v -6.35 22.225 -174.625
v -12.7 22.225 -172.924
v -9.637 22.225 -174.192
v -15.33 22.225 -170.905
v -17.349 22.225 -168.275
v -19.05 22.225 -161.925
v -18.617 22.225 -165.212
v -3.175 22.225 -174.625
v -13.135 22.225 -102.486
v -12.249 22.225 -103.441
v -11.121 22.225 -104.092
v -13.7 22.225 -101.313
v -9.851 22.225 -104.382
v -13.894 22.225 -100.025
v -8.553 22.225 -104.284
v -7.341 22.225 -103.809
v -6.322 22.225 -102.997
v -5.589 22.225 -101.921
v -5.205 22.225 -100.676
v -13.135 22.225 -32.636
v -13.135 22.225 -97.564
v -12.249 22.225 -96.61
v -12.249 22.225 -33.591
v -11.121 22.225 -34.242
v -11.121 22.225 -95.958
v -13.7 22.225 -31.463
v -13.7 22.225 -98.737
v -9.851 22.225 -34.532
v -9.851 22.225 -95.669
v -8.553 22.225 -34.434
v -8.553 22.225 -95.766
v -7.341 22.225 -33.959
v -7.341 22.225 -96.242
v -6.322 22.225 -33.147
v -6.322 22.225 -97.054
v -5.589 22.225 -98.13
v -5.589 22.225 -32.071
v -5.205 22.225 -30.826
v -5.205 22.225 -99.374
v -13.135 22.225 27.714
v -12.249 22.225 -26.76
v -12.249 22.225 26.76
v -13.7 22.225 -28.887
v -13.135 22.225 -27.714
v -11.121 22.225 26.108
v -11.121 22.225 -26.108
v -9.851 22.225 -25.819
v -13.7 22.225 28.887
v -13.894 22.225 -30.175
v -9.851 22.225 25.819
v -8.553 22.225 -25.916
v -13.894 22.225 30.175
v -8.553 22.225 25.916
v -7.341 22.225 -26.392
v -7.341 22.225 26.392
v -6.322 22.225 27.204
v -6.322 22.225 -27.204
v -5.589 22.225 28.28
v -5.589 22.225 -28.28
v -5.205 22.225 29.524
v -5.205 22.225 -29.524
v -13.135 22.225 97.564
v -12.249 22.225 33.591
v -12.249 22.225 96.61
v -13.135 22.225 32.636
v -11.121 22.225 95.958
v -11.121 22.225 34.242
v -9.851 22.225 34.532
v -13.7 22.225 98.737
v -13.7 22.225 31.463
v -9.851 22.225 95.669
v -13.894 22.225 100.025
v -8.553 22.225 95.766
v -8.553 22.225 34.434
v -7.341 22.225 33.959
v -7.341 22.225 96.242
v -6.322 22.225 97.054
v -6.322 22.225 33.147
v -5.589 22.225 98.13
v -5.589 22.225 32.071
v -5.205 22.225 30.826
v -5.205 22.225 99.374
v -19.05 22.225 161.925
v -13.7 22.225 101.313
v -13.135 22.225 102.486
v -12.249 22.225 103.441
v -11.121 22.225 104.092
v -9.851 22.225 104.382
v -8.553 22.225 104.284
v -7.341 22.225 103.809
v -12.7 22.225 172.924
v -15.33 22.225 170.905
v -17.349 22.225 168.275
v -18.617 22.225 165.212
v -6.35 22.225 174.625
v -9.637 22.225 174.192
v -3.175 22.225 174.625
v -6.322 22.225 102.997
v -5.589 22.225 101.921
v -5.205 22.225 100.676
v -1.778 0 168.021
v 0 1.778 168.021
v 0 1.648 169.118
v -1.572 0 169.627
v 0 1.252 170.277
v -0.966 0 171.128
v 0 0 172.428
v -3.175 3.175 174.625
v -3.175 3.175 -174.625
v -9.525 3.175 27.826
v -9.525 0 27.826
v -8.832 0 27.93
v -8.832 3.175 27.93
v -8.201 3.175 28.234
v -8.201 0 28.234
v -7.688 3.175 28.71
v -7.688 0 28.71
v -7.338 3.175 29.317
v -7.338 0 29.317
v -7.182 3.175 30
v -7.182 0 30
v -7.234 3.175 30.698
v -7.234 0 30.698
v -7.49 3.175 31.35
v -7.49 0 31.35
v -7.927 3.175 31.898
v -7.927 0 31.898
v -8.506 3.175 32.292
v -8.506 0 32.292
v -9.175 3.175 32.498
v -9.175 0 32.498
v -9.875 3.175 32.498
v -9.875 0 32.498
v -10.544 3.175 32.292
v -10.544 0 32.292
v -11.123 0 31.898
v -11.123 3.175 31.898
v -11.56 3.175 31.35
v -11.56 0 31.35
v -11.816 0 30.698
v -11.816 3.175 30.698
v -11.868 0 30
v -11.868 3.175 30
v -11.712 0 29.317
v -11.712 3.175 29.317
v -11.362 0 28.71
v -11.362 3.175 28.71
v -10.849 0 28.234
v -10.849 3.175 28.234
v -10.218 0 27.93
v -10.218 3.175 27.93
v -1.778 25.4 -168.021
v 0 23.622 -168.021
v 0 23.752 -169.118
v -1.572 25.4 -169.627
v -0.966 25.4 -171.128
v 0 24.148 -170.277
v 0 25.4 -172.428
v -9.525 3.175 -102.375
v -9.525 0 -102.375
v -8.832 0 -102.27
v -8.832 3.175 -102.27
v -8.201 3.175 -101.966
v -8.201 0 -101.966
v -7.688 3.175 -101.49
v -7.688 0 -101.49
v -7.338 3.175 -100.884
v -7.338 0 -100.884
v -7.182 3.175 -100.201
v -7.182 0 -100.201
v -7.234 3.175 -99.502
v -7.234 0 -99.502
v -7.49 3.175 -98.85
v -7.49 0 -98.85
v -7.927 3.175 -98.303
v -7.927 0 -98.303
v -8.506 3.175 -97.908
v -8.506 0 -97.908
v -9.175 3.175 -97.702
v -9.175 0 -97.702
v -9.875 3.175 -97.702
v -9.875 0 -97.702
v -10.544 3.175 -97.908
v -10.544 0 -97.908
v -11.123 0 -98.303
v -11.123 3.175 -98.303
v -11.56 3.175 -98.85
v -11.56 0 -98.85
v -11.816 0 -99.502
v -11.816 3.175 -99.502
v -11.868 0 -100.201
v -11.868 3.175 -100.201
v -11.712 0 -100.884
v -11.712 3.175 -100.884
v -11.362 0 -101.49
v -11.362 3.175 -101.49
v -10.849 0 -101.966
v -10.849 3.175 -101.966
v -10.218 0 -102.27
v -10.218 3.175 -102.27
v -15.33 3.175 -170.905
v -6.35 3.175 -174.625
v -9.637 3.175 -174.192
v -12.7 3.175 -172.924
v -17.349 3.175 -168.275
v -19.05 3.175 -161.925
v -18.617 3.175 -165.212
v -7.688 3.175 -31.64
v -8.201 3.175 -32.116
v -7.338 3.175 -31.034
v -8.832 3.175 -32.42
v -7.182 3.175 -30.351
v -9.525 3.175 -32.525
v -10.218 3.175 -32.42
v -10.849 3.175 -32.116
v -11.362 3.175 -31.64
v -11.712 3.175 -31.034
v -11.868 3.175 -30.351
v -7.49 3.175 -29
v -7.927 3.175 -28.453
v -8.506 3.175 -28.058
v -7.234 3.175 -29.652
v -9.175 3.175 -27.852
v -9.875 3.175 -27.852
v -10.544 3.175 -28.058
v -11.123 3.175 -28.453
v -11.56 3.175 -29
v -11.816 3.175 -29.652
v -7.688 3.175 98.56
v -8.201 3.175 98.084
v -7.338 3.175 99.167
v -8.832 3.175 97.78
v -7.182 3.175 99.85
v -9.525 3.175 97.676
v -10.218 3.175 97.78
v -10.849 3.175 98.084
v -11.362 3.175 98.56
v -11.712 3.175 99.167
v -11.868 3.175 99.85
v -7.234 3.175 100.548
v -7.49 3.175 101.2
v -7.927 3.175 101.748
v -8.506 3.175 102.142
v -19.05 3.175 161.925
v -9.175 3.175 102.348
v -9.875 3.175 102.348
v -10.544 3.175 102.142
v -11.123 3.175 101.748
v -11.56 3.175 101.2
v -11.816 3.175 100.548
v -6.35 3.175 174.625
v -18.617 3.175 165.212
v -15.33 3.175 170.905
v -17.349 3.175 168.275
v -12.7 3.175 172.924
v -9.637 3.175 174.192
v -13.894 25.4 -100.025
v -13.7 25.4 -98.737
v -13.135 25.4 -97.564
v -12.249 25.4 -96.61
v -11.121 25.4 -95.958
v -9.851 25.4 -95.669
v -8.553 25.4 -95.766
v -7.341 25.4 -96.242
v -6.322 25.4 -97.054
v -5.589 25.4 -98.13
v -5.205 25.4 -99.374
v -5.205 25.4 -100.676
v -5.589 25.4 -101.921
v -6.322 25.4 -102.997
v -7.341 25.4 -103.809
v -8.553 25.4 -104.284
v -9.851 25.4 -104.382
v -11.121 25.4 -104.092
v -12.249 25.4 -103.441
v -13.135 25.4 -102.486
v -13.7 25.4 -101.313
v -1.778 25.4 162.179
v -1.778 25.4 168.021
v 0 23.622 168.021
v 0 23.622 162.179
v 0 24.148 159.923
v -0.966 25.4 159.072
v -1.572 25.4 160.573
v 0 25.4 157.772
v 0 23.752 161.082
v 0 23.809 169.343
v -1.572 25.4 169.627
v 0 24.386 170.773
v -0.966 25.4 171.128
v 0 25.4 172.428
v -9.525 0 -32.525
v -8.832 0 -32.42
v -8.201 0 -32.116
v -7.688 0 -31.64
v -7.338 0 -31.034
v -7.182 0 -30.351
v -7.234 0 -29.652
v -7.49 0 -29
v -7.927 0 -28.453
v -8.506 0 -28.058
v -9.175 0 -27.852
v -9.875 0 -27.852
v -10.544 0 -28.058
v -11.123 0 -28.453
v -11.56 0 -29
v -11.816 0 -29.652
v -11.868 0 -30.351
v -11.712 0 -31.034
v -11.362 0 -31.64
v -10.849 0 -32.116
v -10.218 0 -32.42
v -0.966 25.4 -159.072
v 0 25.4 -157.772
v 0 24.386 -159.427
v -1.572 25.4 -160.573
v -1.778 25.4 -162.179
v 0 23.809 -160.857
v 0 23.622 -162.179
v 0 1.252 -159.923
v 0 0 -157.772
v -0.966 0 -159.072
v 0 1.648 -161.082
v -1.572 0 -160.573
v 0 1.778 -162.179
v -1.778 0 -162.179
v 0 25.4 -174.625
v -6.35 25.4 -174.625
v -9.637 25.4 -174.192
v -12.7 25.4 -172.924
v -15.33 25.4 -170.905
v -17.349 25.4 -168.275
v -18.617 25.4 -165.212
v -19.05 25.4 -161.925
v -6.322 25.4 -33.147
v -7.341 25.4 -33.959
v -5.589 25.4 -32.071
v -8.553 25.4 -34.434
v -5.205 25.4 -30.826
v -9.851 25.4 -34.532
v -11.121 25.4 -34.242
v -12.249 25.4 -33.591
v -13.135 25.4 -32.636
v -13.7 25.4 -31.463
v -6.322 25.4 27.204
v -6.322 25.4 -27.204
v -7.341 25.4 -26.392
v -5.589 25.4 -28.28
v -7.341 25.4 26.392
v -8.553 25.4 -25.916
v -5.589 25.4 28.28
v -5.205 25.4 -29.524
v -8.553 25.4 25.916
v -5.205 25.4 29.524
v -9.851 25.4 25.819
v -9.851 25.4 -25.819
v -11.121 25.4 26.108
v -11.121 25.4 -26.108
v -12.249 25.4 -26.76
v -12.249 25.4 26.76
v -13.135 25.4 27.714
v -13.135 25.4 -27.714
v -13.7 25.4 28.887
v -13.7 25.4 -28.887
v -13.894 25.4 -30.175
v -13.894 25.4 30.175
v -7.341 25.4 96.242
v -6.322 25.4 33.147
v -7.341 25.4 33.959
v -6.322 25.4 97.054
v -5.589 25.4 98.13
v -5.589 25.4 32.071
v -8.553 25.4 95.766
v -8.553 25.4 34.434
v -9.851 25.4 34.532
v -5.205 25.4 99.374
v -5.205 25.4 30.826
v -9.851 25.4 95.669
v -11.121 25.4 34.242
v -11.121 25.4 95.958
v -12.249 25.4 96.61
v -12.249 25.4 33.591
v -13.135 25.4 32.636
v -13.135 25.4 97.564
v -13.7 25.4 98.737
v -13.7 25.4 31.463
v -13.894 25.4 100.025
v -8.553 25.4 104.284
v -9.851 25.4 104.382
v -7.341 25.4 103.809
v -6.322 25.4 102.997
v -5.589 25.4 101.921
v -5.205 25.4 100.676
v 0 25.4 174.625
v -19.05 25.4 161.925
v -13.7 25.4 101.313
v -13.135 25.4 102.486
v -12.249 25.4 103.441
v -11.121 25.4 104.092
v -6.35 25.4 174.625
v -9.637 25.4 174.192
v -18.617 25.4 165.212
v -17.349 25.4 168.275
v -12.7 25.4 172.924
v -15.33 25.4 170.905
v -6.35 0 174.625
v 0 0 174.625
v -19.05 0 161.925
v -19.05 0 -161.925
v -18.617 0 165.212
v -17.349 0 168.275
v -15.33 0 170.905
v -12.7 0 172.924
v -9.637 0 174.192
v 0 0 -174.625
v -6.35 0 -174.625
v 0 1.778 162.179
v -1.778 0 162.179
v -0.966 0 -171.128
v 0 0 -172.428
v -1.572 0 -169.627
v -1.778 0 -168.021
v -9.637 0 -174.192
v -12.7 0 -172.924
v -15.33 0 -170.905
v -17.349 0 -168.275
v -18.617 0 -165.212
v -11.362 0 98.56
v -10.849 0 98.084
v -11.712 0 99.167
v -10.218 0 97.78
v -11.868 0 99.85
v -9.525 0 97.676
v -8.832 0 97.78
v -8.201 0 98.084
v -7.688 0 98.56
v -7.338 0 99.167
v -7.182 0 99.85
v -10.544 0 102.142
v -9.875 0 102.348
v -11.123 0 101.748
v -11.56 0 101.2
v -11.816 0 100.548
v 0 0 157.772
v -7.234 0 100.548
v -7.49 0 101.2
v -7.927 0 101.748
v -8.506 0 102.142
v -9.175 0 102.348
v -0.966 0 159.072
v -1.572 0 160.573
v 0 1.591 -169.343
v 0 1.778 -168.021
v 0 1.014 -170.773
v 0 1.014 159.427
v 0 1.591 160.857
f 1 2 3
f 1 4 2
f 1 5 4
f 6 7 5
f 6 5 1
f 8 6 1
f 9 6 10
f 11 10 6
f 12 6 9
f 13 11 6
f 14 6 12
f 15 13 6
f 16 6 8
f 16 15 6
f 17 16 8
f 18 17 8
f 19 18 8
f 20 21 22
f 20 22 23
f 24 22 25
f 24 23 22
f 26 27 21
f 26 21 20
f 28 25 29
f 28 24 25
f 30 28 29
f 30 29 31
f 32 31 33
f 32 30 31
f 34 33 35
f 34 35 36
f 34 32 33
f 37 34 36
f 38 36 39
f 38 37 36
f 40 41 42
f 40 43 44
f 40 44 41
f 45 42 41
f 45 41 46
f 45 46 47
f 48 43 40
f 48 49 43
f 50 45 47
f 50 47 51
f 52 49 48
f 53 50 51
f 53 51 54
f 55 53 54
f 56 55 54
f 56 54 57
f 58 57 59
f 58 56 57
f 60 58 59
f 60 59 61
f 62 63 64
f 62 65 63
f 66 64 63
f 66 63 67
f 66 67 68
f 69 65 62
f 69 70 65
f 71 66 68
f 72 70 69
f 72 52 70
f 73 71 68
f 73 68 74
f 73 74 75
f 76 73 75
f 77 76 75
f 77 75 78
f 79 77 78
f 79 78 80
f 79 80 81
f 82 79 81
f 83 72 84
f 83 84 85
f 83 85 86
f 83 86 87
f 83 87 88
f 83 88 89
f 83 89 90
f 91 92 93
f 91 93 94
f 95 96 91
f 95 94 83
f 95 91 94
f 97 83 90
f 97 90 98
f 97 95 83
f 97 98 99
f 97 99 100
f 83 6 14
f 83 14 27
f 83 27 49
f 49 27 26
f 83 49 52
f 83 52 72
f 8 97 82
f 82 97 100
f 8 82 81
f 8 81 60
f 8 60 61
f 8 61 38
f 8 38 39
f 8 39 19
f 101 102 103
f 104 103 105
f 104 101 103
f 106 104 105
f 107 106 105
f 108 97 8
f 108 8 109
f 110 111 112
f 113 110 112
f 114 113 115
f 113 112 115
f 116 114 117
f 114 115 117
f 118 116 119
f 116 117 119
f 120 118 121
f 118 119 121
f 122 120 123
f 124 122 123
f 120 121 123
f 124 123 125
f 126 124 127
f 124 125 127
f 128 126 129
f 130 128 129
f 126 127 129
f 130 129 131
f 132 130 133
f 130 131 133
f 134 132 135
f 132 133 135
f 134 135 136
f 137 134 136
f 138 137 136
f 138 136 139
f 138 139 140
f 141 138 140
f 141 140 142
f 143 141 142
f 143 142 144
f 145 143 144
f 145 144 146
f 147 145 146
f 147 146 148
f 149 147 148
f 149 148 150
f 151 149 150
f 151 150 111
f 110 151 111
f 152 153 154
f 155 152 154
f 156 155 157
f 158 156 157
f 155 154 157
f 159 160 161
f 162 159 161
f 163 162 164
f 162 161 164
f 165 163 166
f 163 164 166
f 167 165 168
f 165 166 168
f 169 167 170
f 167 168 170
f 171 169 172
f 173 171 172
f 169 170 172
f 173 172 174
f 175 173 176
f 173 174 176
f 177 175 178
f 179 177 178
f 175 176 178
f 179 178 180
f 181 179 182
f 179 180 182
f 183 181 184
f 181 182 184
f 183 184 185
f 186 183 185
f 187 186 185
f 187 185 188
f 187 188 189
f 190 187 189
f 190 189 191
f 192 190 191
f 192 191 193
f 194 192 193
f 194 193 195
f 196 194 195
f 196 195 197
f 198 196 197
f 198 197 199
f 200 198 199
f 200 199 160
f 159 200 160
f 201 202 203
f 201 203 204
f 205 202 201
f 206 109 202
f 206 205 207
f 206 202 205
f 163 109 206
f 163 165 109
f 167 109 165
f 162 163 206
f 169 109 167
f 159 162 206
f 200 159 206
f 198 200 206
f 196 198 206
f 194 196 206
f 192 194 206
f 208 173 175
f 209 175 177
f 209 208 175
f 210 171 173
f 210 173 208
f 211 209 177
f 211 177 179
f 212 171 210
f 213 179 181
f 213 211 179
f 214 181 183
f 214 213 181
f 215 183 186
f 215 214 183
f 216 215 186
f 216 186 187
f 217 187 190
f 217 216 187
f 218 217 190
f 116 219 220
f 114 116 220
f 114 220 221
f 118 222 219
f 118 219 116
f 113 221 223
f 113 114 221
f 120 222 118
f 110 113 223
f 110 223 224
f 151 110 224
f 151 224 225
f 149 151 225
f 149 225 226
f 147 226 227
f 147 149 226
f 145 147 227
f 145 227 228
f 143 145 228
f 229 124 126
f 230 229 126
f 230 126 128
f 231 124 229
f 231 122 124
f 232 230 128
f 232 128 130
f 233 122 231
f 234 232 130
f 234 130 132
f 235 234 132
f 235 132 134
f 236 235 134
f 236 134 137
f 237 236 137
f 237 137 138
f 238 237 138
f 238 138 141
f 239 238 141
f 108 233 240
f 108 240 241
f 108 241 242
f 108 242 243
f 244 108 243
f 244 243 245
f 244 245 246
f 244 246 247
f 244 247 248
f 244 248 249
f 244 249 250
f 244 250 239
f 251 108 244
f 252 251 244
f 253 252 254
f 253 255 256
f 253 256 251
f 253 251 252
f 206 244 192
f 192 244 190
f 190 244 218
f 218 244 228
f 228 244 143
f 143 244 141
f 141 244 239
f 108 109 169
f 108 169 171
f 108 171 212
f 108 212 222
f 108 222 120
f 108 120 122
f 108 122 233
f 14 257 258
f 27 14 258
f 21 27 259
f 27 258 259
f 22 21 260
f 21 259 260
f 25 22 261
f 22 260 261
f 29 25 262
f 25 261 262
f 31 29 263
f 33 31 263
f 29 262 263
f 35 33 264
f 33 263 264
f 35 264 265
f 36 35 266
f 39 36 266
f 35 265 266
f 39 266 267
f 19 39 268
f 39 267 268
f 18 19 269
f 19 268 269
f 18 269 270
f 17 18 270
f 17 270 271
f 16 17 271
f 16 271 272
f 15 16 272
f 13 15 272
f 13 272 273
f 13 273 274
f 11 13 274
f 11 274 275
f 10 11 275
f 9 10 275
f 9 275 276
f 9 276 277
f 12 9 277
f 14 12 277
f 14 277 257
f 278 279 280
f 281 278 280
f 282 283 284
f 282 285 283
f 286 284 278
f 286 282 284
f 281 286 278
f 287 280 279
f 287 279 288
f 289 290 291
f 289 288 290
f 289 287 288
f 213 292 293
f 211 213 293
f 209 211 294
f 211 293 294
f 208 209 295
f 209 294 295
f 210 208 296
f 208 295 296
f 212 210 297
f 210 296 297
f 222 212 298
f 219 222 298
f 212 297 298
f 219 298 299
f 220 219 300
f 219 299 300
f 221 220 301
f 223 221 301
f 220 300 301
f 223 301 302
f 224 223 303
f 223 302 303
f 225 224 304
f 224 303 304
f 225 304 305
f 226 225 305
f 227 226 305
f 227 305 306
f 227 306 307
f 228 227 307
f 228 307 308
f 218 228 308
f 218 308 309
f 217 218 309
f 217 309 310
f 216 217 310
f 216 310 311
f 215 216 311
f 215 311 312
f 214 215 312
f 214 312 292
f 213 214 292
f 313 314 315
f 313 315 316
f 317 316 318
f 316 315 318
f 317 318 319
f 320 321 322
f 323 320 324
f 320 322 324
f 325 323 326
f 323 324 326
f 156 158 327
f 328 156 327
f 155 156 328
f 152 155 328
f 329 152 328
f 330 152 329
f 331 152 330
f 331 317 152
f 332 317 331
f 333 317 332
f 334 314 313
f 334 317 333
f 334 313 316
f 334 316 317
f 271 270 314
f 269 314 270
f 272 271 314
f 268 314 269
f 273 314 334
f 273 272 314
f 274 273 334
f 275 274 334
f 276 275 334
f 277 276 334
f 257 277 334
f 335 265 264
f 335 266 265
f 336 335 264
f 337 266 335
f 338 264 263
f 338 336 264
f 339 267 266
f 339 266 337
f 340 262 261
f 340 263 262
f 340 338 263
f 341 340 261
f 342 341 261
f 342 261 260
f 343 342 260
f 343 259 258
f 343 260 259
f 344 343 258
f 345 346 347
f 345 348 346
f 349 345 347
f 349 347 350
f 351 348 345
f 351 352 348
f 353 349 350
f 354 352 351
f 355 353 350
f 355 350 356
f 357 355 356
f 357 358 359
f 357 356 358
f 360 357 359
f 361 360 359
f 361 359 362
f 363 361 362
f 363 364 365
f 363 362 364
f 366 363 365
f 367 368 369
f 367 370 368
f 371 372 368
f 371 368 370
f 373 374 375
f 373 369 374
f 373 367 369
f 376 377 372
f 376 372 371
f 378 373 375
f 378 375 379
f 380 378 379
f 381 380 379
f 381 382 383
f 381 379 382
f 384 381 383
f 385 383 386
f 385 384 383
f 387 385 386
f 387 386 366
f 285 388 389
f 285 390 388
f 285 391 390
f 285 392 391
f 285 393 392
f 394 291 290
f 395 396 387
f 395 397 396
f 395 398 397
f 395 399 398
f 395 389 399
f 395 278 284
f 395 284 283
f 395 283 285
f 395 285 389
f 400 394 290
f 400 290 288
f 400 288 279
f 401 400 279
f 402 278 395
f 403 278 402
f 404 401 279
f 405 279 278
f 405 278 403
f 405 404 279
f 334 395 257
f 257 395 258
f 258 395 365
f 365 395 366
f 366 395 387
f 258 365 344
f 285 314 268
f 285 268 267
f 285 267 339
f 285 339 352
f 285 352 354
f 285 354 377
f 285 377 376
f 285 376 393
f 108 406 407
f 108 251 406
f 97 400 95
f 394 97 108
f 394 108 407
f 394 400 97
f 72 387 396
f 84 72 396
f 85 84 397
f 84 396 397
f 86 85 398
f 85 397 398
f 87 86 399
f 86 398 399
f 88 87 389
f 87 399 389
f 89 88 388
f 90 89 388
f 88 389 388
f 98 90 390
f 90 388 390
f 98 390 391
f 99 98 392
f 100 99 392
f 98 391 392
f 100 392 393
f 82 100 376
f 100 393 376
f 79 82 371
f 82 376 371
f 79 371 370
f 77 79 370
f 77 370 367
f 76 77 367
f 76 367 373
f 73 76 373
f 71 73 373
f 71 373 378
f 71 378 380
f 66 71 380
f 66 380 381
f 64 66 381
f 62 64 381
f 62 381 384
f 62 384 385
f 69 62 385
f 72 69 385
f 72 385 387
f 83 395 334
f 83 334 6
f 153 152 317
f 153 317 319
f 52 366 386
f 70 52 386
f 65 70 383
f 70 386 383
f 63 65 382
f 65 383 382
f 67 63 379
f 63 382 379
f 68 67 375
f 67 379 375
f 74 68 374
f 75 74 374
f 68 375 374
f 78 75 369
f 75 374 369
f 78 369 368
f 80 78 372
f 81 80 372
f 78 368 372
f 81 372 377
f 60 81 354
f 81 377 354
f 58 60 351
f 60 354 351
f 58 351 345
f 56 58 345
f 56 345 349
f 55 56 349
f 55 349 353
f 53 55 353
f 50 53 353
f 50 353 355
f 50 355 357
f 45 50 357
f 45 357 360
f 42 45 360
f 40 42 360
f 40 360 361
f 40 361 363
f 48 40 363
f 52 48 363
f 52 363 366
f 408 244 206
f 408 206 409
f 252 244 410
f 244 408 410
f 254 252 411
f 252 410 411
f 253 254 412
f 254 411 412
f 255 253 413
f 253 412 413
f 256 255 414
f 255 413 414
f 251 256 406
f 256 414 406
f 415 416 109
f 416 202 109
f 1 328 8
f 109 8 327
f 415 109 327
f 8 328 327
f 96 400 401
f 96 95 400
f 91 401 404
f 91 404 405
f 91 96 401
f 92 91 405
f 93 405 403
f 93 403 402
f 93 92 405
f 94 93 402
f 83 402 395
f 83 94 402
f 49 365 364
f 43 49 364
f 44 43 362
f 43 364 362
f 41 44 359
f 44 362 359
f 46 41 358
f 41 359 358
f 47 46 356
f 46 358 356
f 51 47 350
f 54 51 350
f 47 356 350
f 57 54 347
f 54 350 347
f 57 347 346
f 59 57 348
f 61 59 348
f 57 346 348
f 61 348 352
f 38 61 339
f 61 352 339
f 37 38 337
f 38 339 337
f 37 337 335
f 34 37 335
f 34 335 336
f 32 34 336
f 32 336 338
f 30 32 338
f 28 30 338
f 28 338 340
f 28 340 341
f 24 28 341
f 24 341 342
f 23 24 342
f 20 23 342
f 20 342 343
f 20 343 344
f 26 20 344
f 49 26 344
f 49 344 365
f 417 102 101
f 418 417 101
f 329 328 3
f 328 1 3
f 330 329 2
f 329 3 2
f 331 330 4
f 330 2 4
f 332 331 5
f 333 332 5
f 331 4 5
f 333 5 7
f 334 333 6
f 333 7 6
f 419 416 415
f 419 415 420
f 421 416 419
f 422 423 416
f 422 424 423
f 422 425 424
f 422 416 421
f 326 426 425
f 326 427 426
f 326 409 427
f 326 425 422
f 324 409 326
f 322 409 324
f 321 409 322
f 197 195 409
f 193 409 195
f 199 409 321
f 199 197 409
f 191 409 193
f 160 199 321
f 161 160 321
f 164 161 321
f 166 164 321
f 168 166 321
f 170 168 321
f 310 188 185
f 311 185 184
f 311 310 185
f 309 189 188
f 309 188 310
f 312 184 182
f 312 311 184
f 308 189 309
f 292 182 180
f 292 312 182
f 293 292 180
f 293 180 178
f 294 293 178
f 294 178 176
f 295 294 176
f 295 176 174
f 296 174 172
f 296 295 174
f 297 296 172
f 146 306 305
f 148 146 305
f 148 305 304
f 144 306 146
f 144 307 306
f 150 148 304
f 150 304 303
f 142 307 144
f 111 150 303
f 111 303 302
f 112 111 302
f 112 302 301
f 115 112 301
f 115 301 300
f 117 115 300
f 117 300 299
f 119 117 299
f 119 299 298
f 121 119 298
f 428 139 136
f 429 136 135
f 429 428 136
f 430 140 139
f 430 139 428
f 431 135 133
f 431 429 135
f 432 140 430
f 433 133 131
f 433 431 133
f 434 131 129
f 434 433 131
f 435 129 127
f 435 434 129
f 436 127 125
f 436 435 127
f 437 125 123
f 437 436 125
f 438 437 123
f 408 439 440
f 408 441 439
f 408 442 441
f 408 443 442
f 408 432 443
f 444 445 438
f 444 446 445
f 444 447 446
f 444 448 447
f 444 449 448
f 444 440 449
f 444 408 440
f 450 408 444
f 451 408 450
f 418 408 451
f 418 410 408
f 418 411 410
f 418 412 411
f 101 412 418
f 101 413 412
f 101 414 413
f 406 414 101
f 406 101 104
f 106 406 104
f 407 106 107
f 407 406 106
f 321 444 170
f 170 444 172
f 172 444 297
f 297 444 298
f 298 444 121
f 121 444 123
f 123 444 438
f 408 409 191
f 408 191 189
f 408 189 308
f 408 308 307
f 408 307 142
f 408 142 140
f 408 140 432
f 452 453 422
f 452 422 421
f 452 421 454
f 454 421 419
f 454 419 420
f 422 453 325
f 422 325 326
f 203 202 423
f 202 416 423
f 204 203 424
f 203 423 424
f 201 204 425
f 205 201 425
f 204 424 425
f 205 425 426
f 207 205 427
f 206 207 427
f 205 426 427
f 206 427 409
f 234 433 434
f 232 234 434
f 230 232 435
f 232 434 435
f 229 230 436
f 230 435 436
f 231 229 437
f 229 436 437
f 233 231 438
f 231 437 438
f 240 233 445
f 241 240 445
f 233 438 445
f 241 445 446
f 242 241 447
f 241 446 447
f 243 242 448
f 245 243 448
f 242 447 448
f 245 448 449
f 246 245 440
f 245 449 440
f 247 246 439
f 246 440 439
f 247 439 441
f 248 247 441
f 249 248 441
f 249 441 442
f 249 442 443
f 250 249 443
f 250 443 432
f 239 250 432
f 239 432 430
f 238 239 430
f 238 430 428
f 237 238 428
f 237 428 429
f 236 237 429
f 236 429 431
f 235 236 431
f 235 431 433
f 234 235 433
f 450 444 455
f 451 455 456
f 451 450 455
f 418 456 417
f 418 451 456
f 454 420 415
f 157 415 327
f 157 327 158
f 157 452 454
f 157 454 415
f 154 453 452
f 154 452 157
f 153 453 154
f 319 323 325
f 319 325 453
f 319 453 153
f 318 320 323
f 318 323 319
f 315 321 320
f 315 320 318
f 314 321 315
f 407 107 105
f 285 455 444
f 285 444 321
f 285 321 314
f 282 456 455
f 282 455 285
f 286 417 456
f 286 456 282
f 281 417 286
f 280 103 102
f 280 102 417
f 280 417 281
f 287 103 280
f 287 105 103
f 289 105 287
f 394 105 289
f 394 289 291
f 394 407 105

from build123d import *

# Parameters (mm, degrees)
BOSS_EXTRUDE1_DEPTH = 174.625
CUT_EXTRUDE1_REACH  = 179.488
SKETCH3_R           = 2.3495
CUT_EXTRUDE2_REACH  = 179.488
SKETCH4_R           = 4.3688
FILLET1_R           = 12.7


with BuildPart() as part:
    # Sketch1 → Boss-Extrude1 (new, symmetric)
    with BuildSketch(Plane.XY):
        Polygon((-19.05, 0), (0, 0), (0, 25.4), (-19.05, 25.4), (-19.05, 22.225), (-3.175, 22.225), (-3.175, 3.175), (-19.05, 3.175), align=None)
    extrude(amount=BOSS_EXTRUDE1_DEPTH, both=True)

    # Sketch3 → Cut-Extrude1 (cut, up to next)
    with BuildSketch(Plane.XZ, mode=Mode.PRIVATE) as cut_extrude1_sk1:
        with Locations(Location((-9.525, -30.1752, 0), (0, 0, 270))):
            Circle(SKETCH3_R)
    cut_extrude1_tool1 = extrude(cut_extrude1_sk1.sketch, amount=-CUT_EXTRUDE1_REACH, mode=Mode.PRIVATE) & part.part
    # Sketch3 → Cut-Extrude1 (cut, up to next)
    with BuildSketch(Plane.XZ, mode=Mode.PRIVATE) as cut_extrude1_sk2:
        with Locations(Location((-9.525, -100.0252, 0), (0, 0, 270))):
            Circle(SKETCH3_R)
    cut_extrude1_tool2 = extrude(cut_extrude1_sk2.sketch, amount=-CUT_EXTRUDE1_REACH, mode=Mode.PRIVATE) & part.part
    # Sketch3 → Cut-Extrude1 (cut, up to next)
    with BuildSketch(Plane.XZ, mode=Mode.PRIVATE) as cut_extrude1_sk3:
        with Locations(Location((-9.525, 30.1752, 0), (0, 0, 270))):
            Circle(SKETCH3_R)
    cut_extrude1_tool3 = extrude(cut_extrude1_sk3.sketch, amount=-CUT_EXTRUDE1_REACH, mode=Mode.PRIVATE) & part.part
    # Sketch3 → Cut-Extrude1 (cut, up to next)
    with BuildSketch(Plane.XZ, mode=Mode.PRIVATE) as cut_extrude1_sk4:
        with Locations(Location((-9.525, 100.0252, 0), (0, 0, 270))):
            Circle(SKETCH3_R)
    cut_extrude1_tool4 = extrude(cut_extrude1_sk4.sketch, amount=-CUT_EXTRUDE1_REACH, mode=Mode.PRIVATE) & part.part
    add(cut_extrude1_tool1.solids().sort_by_distance((-9.525, 0, -30.1752))[0], mode=Mode.SUBTRACT)
    add(cut_extrude1_tool2.solids().sort_by_distance((-9.525, 0, -100.0252))[0], mode=Mode.SUBTRACT)
    add(cut_extrude1_tool3.solids().sort_by_distance((-9.525, 0, 30.1752))[0], mode=Mode.SUBTRACT)
    add(cut_extrude1_tool4.solids().sort_by_distance((-9.525, 0, 100.0252))[0], mode=Mode.SUBTRACT)

    # Sketch4 → Cut-Extrude2 (cut, up to next)
    with BuildSketch(Plane(origin=(0, 25.4, 0), x_dir=(1, 0, 0), z_dir=(0, 1, 0)), mode=Mode.PRIVATE) as cut_extrude2_sk1:
        with Locations(Location((-9.525, -100.0252, 0), (0, 0, 180))):
            Circle(SKETCH4_R)
    cut_extrude2_tool1 = extrude(cut_extrude2_sk1.sketch, amount=-CUT_EXTRUDE2_REACH, mode=Mode.PRIVATE) & part.part
    # Sketch4 → Cut-Extrude2 (cut, up to next)
    with BuildSketch(Plane(origin=(0, 25.4, 0), x_dir=(1, 0, 0), z_dir=(0, 1, 0)), mode=Mode.PRIVATE) as cut_extrude2_sk2:
        with Locations(Location((-9.525, -30.1752, 0), (0, 0, 180))):
            Circle(SKETCH4_R)
    cut_extrude2_tool2 = extrude(cut_extrude2_sk2.sketch, amount=-CUT_EXTRUDE2_REACH, mode=Mode.PRIVATE) & part.part
    # Sketch4 → Cut-Extrude2 (cut, up to next)
    with BuildSketch(Plane(origin=(0, 25.4, 0), x_dir=(1, 0, 0), z_dir=(0, 1, 0)), mode=Mode.PRIVATE) as cut_extrude2_sk3:
        with Locations(Location((-9.525, 30.1752, 0), (0, 0, 180))):
            Circle(SKETCH4_R)
    cut_extrude2_tool3 = extrude(cut_extrude2_sk3.sketch, amount=-CUT_EXTRUDE2_REACH, mode=Mode.PRIVATE) & part.part
    # Sketch4 → Cut-Extrude2 (cut, up to next)
    with BuildSketch(Plane(origin=(0, 25.4, 0), x_dir=(1, 0, 0), z_dir=(0, 1, 0)), mode=Mode.PRIVATE) as cut_extrude2_sk4:
        with Locations(Location((-9.525, 100.0252, 0), (0, 0, 180))):
            Circle(SKETCH4_R)
    cut_extrude2_tool4 = extrude(cut_extrude2_sk4.sketch, amount=-CUT_EXTRUDE2_REACH, mode=Mode.PRIVATE) & part.part
    add(cut_extrude2_tool1.solids().sort_by_distance((-9.525, 25.4, 100.0252))[0], mode=Mode.SUBTRACT)
    add(cut_extrude2_tool2.solids().sort_by_distance((-9.525, 25.4, 30.1752))[0], mode=Mode.SUBTRACT)
    add(cut_extrude2_tool3.solids().sort_by_distance((-9.525, 25.4, -30.1752))[0], mode=Mode.SUBTRACT)
    add(cut_extrude2_tool4.solids().sort_by_distance((-9.525, 25.4, -100.0252))[0], mode=Mode.SUBTRACT)

    # Fillet1
    fillet1_edges = [part.edges().sort_by_distance(p)[0] for p in [
        (-19.05, 1.5875, -174.625),
        (-19.05, 23.8125, 174.625),
        (-19.05, 1.5875, 174.625),
        (-19.05, 23.8125, -174.625),
    ]]
    fillet(fillet1_edges, radius=FILLET1_R)

    # Cut-Sweep1: sweep along a path in Sketch5
    with BuildLine(Plane(origin=(0, 25.4, 0), x_dir=(1, 0, 0), z_dir=(0, 1, 0))) as cut_sweep1_path:
        Line((7.112, -155.829), (4.572, -155.829))
        ThreePointArc((4.572, -155.829), (0.081871939, -157.688871939), (-1.778, -162.179))
        Line((-1.778, -162.179), (-1.778, -168.021))
        ThreePointArc((-1.778, -168.021), (0.081871939, -172.511128061), (4.572, -174.371))
        Line((4.572, -174.371), (7.112, -174.371))
    # Sketch6 → Cut-Sweep1 (sweep, cut)
    with BuildSketch(Plane(origin=(7.112, 25.4, 174.371), x_dir=(0, 0, -1), z_dir=(1, 0, 0))):
        Polygon((-0.508, 0.508), (4.572, -4.572), (4.572, 0.508), align=None)
        Polygon((4.572, -20.828), (4.572, -25.908), (-0.508, -25.908), align=None)
    cut_sweep1 = sweep(path=cut_sweep1_path.line, mode=Mode.SUBTRACT)

    # Mirror1: Cut-Sweep1 across plane
    add(cut_sweep1.mirror(Plane.XY), mode=Mode.SUBTRACT)


solid = part.part
